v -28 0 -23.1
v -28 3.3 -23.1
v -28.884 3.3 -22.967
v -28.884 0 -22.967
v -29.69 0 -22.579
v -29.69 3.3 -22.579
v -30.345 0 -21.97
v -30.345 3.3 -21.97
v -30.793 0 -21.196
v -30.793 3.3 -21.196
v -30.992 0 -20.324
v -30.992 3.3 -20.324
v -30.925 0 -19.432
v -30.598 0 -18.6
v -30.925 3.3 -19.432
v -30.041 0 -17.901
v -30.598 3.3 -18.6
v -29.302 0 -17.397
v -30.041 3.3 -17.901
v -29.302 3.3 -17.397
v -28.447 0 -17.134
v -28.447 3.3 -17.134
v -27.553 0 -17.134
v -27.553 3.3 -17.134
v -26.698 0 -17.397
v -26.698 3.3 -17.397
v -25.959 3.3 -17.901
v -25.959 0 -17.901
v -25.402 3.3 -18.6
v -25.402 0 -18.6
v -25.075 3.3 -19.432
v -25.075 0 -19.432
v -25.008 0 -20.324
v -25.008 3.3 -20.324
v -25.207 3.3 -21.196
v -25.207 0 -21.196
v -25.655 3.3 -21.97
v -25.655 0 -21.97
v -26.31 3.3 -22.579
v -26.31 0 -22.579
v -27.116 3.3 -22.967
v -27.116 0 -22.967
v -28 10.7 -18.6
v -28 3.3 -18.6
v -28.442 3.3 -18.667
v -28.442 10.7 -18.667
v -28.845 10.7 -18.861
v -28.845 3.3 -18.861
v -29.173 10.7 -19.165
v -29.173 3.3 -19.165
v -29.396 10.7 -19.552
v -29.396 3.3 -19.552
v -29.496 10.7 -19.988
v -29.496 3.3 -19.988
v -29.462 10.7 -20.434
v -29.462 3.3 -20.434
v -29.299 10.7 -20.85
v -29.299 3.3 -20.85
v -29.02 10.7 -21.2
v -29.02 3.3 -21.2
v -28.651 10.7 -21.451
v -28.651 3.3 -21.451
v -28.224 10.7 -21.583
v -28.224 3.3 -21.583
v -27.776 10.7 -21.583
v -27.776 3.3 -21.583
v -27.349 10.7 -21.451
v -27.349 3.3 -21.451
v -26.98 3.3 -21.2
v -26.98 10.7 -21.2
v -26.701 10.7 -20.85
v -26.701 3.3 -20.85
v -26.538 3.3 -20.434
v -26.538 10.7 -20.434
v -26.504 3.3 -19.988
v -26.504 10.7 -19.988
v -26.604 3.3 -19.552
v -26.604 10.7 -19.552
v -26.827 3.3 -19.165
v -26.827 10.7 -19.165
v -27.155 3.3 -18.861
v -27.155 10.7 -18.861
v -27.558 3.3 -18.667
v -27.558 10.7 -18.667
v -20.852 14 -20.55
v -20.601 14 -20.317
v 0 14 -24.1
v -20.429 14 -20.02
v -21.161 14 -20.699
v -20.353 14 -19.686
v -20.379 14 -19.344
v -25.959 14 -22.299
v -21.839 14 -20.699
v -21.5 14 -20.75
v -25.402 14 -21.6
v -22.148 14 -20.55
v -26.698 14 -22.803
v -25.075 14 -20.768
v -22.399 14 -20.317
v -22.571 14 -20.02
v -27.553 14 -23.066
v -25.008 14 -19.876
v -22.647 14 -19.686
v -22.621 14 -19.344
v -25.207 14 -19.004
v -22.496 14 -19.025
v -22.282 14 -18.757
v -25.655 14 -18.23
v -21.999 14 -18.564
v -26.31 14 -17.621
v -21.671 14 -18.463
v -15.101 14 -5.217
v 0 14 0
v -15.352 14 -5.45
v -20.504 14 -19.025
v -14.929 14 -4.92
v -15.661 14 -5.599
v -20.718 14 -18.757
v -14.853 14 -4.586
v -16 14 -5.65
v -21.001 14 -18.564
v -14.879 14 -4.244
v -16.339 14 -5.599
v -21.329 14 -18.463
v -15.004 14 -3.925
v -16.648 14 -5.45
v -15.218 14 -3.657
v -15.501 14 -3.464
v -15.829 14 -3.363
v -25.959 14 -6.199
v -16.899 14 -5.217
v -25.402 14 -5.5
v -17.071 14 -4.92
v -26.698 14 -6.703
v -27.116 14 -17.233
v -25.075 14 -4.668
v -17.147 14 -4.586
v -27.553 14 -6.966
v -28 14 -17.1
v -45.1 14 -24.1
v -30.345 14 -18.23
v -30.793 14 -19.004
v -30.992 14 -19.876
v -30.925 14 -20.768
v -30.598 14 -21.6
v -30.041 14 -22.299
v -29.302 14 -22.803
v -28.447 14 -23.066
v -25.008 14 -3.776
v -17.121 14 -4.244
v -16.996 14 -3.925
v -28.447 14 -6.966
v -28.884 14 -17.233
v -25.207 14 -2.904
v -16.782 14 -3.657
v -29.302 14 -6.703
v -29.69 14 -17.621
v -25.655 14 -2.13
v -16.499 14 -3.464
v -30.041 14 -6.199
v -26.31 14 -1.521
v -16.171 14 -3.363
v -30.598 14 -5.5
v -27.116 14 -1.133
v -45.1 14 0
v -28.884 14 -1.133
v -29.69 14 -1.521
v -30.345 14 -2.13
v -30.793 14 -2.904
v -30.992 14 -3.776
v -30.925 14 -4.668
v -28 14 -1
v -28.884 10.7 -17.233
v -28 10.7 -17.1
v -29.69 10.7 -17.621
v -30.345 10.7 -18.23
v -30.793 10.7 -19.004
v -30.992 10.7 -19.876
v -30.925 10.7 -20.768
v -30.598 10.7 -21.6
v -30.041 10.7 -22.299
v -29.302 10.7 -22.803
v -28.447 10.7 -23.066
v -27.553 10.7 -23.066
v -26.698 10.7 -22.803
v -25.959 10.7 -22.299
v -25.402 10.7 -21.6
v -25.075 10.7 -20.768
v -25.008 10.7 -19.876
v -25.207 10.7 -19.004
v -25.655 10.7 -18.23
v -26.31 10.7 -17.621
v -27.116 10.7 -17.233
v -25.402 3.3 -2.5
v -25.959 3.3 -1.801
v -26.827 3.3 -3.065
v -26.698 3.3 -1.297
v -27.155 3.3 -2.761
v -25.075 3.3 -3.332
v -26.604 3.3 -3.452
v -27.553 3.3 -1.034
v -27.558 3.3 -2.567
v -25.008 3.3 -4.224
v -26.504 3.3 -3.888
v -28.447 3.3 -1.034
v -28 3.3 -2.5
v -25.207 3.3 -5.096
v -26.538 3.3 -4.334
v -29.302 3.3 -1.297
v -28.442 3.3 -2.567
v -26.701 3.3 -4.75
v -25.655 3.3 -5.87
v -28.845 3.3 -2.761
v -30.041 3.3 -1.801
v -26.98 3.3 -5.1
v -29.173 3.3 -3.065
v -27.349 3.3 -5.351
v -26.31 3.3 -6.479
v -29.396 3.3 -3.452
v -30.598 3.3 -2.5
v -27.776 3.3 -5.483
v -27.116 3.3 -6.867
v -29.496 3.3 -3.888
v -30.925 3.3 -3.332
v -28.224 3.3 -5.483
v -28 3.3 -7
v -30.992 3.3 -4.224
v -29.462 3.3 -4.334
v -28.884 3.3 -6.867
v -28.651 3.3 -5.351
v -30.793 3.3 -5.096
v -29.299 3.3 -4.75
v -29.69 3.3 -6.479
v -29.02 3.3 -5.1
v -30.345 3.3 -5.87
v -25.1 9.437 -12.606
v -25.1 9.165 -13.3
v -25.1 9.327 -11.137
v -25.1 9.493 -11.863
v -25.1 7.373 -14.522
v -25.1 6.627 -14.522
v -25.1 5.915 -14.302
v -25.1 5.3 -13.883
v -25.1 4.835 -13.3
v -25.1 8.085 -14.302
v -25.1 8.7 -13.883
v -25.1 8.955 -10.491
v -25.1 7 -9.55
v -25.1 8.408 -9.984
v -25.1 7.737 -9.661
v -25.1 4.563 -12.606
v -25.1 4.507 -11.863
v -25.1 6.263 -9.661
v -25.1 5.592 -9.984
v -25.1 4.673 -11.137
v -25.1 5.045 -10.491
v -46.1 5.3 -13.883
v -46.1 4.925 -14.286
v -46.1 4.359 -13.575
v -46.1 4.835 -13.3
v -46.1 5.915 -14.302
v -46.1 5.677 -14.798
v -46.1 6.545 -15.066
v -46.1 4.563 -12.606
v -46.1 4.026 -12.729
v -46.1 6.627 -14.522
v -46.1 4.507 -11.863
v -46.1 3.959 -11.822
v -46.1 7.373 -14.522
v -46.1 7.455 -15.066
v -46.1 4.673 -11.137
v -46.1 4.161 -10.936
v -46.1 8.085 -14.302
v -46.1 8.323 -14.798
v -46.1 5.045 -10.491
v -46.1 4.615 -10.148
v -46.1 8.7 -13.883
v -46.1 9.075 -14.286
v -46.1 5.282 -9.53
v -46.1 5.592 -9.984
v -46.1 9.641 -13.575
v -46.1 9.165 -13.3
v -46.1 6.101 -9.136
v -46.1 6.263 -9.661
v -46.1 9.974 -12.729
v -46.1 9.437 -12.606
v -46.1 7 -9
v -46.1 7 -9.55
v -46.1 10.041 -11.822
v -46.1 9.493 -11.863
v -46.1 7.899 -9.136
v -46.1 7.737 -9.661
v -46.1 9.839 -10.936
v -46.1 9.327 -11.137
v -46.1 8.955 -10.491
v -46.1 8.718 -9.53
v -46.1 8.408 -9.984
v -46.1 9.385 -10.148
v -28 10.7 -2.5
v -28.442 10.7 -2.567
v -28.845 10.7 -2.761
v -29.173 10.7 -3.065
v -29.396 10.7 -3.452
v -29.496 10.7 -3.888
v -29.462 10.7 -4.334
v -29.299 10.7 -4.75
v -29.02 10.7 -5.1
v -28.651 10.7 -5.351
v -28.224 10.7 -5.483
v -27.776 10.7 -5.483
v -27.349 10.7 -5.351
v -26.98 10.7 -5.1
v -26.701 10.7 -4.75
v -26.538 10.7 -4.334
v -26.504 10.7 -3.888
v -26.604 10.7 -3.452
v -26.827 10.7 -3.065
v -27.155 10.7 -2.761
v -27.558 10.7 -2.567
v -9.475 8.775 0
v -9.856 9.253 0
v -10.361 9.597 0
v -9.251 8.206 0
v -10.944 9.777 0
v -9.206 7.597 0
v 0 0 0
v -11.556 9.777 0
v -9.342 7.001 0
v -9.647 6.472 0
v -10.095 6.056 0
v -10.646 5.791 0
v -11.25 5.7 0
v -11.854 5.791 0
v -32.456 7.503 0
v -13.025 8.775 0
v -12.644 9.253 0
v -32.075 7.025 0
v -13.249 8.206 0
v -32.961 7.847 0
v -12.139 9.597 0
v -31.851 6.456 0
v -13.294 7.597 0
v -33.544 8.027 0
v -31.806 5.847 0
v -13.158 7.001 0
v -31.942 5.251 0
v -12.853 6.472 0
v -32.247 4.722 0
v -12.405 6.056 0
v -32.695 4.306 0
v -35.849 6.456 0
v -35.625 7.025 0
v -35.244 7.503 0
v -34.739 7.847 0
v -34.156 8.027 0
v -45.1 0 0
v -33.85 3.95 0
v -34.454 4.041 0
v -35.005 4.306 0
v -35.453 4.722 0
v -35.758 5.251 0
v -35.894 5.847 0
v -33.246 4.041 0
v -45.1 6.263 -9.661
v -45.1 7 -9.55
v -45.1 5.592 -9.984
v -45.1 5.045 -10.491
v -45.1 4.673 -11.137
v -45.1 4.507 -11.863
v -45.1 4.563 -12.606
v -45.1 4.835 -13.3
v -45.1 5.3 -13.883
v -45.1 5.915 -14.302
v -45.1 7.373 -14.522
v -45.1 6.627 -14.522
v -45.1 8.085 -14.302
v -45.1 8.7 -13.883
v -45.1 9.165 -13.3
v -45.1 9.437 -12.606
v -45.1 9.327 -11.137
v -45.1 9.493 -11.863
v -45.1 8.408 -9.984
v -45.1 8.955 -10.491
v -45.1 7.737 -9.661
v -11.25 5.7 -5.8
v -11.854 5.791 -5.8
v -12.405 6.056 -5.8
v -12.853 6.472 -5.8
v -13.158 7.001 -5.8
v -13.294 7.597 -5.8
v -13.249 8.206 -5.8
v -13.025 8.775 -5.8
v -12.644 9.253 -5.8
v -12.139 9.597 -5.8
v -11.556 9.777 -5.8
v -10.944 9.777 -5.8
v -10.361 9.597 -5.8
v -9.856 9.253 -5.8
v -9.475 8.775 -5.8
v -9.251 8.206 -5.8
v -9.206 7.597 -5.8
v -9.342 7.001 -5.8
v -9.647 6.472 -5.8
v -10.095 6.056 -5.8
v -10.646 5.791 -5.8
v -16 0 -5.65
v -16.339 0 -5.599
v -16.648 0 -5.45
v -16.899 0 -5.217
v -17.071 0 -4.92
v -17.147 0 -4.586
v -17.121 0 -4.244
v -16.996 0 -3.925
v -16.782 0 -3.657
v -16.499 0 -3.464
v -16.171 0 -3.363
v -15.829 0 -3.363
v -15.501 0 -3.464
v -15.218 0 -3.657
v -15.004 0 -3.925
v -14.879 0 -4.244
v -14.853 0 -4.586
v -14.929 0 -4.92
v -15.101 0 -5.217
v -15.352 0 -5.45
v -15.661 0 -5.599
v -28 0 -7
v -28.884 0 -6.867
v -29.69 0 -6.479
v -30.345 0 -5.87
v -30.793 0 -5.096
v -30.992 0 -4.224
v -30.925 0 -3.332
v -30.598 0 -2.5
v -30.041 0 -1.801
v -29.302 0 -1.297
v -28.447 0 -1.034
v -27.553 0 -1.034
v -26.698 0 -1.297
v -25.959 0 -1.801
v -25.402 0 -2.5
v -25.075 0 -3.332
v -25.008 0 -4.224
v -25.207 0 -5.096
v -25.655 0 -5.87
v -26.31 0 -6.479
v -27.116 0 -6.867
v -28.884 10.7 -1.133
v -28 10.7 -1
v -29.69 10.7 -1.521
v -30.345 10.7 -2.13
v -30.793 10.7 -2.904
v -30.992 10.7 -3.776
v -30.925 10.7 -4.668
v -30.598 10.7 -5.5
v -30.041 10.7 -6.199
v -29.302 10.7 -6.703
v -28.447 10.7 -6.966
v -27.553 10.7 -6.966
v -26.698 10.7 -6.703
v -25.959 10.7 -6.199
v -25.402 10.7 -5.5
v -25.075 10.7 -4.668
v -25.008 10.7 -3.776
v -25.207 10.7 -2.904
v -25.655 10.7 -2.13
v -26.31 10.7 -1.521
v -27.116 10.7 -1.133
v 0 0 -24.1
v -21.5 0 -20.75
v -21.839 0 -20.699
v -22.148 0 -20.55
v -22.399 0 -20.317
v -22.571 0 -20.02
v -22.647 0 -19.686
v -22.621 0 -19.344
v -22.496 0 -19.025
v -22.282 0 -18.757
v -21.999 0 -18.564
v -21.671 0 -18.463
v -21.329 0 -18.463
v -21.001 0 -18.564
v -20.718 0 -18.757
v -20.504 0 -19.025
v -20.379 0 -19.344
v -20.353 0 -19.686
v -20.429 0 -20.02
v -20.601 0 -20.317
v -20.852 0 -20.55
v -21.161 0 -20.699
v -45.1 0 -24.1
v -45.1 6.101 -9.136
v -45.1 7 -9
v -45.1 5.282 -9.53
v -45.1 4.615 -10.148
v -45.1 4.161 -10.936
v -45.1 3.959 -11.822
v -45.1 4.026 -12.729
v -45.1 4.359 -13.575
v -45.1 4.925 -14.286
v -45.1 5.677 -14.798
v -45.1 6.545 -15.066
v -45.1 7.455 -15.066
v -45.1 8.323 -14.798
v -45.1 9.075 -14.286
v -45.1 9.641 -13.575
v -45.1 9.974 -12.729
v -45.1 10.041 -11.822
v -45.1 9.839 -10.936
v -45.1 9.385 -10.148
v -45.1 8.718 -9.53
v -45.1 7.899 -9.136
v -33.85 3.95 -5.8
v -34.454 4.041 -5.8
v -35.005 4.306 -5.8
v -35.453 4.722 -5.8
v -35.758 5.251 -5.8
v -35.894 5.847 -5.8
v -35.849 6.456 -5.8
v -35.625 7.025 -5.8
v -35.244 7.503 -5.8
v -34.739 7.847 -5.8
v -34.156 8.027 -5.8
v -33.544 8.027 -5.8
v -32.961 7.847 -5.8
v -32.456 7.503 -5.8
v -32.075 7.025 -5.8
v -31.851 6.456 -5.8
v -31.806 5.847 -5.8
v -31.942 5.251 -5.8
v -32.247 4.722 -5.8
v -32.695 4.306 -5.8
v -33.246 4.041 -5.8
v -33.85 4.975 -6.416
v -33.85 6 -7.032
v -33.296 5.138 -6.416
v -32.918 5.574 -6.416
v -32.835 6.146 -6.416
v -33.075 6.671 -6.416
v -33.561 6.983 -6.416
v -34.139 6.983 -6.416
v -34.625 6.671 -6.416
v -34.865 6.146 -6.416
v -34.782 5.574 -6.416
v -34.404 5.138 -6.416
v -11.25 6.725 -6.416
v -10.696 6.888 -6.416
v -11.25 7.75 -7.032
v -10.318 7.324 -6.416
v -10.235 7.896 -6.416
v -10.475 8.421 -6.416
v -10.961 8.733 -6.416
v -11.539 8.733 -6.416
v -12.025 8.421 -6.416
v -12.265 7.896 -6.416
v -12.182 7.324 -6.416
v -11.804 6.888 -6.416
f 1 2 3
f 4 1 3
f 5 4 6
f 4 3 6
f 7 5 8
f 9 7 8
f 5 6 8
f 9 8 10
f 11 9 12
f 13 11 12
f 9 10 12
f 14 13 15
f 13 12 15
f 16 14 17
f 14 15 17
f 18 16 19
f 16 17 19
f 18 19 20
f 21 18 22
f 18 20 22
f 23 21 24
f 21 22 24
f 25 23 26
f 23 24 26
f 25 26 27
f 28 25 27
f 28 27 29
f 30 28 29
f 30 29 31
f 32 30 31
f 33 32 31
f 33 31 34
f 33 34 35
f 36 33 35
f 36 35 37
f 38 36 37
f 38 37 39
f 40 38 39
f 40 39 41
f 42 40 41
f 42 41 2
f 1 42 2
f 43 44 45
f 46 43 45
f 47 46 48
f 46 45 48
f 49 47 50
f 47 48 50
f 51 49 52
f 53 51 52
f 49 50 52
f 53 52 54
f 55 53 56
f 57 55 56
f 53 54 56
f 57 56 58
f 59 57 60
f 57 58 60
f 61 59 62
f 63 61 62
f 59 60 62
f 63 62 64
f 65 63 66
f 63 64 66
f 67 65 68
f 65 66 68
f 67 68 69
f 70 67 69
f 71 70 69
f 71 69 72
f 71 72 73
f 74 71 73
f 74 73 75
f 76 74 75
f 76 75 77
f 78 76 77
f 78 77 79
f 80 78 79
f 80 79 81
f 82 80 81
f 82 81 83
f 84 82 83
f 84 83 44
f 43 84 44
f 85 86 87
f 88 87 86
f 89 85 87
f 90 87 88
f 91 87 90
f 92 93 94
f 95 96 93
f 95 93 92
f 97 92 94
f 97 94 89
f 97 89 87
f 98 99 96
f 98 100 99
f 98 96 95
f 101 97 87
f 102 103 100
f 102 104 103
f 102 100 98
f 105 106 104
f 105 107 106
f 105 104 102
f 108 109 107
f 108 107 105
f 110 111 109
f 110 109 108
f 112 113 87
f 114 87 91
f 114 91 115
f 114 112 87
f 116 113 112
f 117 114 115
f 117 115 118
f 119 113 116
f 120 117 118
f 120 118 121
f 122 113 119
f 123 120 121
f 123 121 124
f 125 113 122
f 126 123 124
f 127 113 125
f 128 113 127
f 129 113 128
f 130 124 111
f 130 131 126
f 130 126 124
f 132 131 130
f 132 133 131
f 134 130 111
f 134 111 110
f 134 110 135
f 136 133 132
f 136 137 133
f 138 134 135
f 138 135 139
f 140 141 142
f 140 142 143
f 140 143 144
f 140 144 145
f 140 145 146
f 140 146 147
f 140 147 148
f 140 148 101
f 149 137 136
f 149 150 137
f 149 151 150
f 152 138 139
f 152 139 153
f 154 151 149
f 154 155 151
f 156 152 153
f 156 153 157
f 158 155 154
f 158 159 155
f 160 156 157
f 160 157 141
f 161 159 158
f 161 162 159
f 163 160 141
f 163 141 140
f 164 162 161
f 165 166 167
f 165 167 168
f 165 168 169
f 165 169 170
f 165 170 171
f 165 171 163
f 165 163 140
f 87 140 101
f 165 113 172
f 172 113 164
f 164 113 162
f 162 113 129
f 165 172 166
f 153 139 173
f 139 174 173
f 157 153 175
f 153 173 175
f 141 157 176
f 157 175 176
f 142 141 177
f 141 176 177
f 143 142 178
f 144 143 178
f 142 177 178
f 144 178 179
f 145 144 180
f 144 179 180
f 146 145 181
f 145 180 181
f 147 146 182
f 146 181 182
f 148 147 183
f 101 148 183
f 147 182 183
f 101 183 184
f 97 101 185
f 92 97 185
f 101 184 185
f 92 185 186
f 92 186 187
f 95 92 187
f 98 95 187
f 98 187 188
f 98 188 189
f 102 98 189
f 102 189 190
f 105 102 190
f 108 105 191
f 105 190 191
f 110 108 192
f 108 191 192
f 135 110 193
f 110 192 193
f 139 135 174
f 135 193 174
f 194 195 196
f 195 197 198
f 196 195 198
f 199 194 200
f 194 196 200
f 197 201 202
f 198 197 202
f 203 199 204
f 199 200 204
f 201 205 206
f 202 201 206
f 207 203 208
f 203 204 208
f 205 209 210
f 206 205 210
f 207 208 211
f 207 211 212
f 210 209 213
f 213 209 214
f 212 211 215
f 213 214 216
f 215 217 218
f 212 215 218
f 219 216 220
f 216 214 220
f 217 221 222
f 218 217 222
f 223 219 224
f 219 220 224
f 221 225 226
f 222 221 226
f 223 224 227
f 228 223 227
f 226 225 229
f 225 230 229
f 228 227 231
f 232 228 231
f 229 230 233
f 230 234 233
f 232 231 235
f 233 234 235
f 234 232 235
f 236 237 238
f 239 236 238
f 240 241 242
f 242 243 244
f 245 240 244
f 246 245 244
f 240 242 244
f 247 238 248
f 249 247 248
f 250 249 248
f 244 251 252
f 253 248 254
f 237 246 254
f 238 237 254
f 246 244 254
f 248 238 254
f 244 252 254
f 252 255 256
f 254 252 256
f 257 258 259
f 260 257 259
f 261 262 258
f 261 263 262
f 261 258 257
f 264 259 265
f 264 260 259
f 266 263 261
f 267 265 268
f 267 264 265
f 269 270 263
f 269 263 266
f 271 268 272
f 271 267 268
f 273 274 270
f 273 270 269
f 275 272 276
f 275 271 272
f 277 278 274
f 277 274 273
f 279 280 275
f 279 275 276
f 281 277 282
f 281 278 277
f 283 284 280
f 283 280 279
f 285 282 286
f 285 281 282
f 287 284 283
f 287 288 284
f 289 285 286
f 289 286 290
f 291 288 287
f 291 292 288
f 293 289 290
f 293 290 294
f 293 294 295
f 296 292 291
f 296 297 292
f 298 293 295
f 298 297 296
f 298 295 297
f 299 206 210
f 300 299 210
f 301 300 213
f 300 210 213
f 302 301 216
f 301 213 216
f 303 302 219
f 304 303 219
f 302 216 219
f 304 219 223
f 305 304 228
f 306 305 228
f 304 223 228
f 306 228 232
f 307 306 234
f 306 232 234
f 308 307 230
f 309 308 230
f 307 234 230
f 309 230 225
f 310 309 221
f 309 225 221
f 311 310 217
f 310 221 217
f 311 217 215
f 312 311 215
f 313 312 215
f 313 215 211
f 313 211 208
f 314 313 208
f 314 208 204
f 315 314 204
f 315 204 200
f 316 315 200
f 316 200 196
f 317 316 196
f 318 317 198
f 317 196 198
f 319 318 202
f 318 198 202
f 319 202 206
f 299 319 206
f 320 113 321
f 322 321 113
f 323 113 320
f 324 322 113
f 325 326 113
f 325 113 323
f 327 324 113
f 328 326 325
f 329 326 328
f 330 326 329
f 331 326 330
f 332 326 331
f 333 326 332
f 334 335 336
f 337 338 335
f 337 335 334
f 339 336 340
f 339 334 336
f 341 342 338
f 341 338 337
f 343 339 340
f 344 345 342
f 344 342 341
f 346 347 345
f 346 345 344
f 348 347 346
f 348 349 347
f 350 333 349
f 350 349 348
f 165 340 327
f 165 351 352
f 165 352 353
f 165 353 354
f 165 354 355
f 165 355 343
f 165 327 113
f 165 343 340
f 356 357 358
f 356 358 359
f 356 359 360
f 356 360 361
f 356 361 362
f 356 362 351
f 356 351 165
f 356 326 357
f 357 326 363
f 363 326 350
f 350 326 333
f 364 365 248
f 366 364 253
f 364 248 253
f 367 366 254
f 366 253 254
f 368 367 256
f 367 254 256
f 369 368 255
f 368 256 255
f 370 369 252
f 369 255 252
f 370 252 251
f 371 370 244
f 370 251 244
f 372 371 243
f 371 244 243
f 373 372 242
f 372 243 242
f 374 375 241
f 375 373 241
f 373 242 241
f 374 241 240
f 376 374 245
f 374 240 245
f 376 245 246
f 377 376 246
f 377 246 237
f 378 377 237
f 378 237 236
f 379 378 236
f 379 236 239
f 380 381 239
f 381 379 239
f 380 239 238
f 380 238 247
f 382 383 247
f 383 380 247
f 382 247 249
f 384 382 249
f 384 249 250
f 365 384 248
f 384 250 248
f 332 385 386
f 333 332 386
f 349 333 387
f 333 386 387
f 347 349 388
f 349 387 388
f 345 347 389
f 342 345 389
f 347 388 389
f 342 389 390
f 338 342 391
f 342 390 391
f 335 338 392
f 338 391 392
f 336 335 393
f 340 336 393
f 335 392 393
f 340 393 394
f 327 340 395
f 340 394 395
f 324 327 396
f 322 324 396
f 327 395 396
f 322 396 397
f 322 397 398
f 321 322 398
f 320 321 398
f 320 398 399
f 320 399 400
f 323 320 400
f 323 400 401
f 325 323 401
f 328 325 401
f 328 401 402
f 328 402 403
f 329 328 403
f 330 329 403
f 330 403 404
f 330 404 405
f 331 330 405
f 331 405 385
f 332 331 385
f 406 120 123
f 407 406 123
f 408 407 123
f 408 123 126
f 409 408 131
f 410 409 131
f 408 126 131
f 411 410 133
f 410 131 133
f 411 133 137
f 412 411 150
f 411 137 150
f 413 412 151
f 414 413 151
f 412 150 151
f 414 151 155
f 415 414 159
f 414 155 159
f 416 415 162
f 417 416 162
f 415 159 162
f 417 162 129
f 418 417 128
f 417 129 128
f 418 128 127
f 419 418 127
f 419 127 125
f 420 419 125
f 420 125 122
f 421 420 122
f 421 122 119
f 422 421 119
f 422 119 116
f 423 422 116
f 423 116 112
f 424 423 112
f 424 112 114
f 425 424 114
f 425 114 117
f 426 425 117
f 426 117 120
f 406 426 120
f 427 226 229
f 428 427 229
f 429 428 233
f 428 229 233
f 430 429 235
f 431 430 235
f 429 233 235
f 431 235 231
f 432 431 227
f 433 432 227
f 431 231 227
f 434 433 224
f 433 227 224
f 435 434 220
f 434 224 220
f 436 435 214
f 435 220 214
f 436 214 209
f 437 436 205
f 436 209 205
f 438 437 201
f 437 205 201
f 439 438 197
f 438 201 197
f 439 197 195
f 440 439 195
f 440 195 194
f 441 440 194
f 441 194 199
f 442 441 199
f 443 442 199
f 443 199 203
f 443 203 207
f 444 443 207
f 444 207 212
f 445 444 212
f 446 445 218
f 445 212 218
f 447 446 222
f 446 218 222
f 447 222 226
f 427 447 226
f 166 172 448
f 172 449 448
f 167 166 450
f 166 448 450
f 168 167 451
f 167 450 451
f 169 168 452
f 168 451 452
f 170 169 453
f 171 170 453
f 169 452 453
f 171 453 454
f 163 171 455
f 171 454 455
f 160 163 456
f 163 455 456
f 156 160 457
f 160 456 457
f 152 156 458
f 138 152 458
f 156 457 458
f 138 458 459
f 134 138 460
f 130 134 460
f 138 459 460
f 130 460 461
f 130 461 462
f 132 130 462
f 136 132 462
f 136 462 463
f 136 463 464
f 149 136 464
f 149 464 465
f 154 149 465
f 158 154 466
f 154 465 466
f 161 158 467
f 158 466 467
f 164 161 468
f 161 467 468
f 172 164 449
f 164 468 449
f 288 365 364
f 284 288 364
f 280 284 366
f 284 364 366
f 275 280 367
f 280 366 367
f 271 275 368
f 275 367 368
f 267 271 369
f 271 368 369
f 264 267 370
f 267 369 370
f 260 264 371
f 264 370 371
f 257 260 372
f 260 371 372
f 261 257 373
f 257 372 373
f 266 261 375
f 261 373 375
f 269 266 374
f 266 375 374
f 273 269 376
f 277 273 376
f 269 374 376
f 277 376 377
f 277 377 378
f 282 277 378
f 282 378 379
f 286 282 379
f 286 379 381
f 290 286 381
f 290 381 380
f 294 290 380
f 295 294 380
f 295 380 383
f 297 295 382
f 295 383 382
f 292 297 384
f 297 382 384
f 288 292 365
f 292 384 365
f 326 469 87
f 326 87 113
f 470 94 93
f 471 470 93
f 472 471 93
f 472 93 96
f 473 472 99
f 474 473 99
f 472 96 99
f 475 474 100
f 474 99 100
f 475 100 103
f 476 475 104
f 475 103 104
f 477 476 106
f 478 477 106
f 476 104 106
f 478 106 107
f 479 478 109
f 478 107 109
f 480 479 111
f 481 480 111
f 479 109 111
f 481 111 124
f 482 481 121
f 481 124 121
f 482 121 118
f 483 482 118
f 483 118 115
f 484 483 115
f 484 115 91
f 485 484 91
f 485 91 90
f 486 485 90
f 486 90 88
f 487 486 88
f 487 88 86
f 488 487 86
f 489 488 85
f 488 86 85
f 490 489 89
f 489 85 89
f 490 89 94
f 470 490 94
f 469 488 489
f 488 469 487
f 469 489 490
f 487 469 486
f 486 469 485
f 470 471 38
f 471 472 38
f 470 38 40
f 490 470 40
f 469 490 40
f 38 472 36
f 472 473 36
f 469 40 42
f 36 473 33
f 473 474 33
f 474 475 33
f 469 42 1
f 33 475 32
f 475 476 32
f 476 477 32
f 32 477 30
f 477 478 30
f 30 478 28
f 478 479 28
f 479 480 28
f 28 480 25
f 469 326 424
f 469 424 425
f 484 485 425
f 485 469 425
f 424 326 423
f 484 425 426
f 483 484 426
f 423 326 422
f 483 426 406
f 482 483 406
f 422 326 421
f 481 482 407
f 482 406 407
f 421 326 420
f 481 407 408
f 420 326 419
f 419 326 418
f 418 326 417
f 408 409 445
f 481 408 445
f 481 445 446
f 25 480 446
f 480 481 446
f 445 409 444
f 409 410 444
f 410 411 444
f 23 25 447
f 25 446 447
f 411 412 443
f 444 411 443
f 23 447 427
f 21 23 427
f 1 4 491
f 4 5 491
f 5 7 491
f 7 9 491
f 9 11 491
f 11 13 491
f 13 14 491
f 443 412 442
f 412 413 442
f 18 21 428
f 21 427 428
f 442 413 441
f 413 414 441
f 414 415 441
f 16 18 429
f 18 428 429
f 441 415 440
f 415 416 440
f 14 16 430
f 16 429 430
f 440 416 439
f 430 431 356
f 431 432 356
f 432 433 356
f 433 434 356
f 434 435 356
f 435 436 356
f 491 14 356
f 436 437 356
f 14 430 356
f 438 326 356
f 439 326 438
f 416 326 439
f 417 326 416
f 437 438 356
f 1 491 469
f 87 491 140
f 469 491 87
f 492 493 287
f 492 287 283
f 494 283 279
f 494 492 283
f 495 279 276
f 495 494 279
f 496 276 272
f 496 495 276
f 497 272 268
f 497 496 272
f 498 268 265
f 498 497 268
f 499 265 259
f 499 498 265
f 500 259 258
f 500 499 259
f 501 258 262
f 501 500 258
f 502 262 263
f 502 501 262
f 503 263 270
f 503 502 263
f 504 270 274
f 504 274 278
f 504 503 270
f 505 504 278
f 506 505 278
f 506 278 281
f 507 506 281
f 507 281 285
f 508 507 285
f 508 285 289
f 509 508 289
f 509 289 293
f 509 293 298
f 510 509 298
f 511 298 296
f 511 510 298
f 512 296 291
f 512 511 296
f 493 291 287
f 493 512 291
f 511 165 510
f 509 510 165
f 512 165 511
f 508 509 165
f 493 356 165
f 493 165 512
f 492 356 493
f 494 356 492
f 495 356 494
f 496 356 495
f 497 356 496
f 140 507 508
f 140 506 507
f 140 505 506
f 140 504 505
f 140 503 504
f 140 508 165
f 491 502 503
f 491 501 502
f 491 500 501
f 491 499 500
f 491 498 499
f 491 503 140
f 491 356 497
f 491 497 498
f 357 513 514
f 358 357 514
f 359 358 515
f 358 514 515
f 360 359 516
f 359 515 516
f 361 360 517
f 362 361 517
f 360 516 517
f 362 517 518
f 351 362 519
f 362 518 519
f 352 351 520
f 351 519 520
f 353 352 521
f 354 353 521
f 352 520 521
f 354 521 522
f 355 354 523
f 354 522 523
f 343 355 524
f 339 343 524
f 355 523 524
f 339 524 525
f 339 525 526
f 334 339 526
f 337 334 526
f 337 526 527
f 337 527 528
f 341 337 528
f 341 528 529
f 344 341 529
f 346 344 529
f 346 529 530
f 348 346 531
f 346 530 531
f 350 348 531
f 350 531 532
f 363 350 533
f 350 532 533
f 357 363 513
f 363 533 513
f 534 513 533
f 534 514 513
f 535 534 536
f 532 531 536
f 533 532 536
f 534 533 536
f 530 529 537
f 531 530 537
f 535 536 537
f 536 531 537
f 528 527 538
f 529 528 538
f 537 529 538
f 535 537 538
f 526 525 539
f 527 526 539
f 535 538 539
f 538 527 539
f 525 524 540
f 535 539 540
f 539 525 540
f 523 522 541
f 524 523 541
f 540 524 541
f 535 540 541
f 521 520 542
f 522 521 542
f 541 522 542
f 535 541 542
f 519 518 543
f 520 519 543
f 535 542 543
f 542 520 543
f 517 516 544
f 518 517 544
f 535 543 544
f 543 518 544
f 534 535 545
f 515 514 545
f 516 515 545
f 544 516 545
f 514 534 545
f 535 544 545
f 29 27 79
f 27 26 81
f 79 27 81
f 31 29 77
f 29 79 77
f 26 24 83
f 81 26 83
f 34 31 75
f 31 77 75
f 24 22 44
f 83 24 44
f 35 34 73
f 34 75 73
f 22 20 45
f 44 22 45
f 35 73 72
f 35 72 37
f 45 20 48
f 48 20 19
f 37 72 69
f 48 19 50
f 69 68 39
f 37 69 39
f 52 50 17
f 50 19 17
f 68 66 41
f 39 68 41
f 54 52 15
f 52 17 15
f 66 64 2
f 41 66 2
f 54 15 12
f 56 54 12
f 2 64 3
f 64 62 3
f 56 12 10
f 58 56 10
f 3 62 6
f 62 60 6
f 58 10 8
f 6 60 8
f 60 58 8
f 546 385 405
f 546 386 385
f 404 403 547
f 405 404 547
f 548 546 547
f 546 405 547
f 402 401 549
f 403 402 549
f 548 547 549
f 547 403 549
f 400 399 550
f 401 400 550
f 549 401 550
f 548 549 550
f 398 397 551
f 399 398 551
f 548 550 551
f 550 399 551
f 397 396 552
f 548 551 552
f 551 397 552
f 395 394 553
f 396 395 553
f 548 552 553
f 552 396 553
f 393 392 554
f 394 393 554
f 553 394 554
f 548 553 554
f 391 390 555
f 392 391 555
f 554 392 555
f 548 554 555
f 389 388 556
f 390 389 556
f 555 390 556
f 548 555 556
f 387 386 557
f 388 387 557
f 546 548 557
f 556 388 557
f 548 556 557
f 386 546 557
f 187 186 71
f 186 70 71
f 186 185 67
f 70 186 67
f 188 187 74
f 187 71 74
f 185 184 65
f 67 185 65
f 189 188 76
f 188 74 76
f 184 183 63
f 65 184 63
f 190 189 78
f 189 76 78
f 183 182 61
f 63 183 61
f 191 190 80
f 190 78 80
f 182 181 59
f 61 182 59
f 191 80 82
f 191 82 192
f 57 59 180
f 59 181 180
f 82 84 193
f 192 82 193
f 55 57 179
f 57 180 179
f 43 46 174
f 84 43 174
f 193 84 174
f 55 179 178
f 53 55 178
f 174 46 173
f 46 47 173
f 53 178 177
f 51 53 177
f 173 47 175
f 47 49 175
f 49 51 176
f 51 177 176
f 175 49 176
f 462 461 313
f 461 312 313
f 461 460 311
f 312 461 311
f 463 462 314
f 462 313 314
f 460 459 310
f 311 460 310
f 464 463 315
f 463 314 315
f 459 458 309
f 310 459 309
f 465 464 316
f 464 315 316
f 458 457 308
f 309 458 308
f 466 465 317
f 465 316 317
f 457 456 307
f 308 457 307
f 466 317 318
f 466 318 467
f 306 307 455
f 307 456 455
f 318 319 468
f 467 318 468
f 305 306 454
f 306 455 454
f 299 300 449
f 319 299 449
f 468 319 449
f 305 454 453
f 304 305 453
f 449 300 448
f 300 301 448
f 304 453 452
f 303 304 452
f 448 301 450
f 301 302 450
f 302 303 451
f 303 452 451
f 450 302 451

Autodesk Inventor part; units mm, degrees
ref_plane "YZ Plane" through (0, 0, 0) normal (1, 0, 0) x (0, 1, 0)
ref_plane "XZ Plane" through (0, 0, 0) normal (0, 1, 0) x (-1, 0, 0)
ref_plane "XY Plane" through (0, 0, 0) normal (0, 0, 1) x (1, 0, 0)
sketch "スケッチ1" plane through (0, 0, 0) normal (0, 1, 0) x (-1, 0, 0)
  line L0 (0, 0) -> (45.1, 0)
  line L1 (45.1, 0) -> (45.1, -24.1)
  line L2 (45.1, -24.1) -> (0, -24.1)
  line L3 (0, -24.1) -> (0, 0)
  dimension "d0" = 45.1
  dimension "d1" = 24.1
extrude "押し出し1" add sketch "スケッチ1" along normal blind 14
sketch "スケッチ2" plane through (0, 14, 0) normal (0, 1, 0) x (1, 0, 0)
  line L0 (-45.1, 0) -> (0, 0) projected
  line L1 (-28, 0) -> (-28, 24.1)
  line L2 (0, 24.1) -> (-45.1, 24.1) projected
  point P0 (-28, 4)
  point P1 (-28, 20.1)
  dimension "d4" = 4
  dimension "d5" = 4
hole "穴1" at (-28, 14, -4) at (-28, 14, -20.1) direction (0, -1, 0) diameter 3 end through all counterbore diameter 6 counterbore depth 3.3
sketch "スケッチ3" plane through (0, 0, 0) normal (0, -1, 0) x (1, 0, 0)
  circle A0 centre (-28, -20.1) radius 1.5 projected
  line L0 (-28, -20.1) -> (-28, 0)
  circle A1 centre (-28, -20.1) radius 3 projected
  circle A2 centre (-28, -4) radius 1.5 projected
  point P0 (0, 0)
hole "穴2" at (-28, 0, -20.1) at (-28, 0, -4) direction (0, 1, 0) diameter 3 end through all counterbore diameter 6 counterbore depth 3.3
sketch "スケッチ4" plane through (0, 0, 0) normal (0, -1, 0) x (1, 0, 0)
  line L0 (0, 0) -> (-45.1, 0) projected
  line L1 (-16, 0) -> (-16, -23.8904)
  line L2 (0, -24.1) -> (-45.1, -24.1) projected
  line L3 (-21.5, -24.1) -> (-21.5, 0)
  point P0 (-16, -4.5)
  point P1 (-21.5, -19.6)
  dimension "d20" = 4.5
  dimension "d21" = 4.5
hole "穴3" at (-16, 0, -4.5) at (-21.5, 0, -19.6) direction (0, 1, 0) diameter 2.3 end through all
sketch "スケッチ5" plane through (-45.1, 0, -24.1) normal (-1, 0, 0) x (0, 0, 1)
  line L0 (0, 14) -> (24.1, 14) projected
  line L1 (12.05, 14) -> (12.05, 0)
  circle A0 centre (12.05, 7) radius 3.05
  circle A1 centre (12.05, 7) radius 2.5
  point P0 (24.1, 0)
  dimension "d40" = 6.1
  dimension "d41" = 5
sketch "スケッチ6" plane through (-45.1, 0, 0) normal (0, 0, 1) x (1, 0, 0)
  line L0 (11.25, 13.7757) -> (11.25, 0)
  line L1 (0, 0) -> (0, 14) projected
  line L2 (45.1, 0) -> (0, 0) projected
  line L3 (45.1, 14) -> (0, 14) projected
  line L4 (33.85, 14) -> (33.85, 0)
  line L5 (45.1, 0) -> (45.1, 14) projected
  point P0 (11.25, 6)
  point P1 (33.85, 7.75)
  dimension "d29" = 11.25
  dimension "d30" = 6
  dimension "d31" = 11.25
  dimension "d32" = 6.25
hole "穴4" at (-11.25, 7.75, 0) at (-33.85, 6, 0) direction (0, 0, -1) diameter 4.1 depth 5.8 tip angle 118
extrude "押し出し2" add sketch "スケッチ5" along normal blind 1 contours A0 L1 A1 | L1 A1 A0
sketch "スケッチ8" plane through (-45.1, 0, -24.1) normal (-1, 0, 0) x (0, 0, 1)
  circle A0 centre (12.05, 7) radius 3.05 projected
  point P0 (24.1, 0)
hole "穴5" at (-45.1, 7, -12.05) direction (1, 0, 0) diameter 5 depth 20
properties part number "KOGANEI_BDA10X15"
